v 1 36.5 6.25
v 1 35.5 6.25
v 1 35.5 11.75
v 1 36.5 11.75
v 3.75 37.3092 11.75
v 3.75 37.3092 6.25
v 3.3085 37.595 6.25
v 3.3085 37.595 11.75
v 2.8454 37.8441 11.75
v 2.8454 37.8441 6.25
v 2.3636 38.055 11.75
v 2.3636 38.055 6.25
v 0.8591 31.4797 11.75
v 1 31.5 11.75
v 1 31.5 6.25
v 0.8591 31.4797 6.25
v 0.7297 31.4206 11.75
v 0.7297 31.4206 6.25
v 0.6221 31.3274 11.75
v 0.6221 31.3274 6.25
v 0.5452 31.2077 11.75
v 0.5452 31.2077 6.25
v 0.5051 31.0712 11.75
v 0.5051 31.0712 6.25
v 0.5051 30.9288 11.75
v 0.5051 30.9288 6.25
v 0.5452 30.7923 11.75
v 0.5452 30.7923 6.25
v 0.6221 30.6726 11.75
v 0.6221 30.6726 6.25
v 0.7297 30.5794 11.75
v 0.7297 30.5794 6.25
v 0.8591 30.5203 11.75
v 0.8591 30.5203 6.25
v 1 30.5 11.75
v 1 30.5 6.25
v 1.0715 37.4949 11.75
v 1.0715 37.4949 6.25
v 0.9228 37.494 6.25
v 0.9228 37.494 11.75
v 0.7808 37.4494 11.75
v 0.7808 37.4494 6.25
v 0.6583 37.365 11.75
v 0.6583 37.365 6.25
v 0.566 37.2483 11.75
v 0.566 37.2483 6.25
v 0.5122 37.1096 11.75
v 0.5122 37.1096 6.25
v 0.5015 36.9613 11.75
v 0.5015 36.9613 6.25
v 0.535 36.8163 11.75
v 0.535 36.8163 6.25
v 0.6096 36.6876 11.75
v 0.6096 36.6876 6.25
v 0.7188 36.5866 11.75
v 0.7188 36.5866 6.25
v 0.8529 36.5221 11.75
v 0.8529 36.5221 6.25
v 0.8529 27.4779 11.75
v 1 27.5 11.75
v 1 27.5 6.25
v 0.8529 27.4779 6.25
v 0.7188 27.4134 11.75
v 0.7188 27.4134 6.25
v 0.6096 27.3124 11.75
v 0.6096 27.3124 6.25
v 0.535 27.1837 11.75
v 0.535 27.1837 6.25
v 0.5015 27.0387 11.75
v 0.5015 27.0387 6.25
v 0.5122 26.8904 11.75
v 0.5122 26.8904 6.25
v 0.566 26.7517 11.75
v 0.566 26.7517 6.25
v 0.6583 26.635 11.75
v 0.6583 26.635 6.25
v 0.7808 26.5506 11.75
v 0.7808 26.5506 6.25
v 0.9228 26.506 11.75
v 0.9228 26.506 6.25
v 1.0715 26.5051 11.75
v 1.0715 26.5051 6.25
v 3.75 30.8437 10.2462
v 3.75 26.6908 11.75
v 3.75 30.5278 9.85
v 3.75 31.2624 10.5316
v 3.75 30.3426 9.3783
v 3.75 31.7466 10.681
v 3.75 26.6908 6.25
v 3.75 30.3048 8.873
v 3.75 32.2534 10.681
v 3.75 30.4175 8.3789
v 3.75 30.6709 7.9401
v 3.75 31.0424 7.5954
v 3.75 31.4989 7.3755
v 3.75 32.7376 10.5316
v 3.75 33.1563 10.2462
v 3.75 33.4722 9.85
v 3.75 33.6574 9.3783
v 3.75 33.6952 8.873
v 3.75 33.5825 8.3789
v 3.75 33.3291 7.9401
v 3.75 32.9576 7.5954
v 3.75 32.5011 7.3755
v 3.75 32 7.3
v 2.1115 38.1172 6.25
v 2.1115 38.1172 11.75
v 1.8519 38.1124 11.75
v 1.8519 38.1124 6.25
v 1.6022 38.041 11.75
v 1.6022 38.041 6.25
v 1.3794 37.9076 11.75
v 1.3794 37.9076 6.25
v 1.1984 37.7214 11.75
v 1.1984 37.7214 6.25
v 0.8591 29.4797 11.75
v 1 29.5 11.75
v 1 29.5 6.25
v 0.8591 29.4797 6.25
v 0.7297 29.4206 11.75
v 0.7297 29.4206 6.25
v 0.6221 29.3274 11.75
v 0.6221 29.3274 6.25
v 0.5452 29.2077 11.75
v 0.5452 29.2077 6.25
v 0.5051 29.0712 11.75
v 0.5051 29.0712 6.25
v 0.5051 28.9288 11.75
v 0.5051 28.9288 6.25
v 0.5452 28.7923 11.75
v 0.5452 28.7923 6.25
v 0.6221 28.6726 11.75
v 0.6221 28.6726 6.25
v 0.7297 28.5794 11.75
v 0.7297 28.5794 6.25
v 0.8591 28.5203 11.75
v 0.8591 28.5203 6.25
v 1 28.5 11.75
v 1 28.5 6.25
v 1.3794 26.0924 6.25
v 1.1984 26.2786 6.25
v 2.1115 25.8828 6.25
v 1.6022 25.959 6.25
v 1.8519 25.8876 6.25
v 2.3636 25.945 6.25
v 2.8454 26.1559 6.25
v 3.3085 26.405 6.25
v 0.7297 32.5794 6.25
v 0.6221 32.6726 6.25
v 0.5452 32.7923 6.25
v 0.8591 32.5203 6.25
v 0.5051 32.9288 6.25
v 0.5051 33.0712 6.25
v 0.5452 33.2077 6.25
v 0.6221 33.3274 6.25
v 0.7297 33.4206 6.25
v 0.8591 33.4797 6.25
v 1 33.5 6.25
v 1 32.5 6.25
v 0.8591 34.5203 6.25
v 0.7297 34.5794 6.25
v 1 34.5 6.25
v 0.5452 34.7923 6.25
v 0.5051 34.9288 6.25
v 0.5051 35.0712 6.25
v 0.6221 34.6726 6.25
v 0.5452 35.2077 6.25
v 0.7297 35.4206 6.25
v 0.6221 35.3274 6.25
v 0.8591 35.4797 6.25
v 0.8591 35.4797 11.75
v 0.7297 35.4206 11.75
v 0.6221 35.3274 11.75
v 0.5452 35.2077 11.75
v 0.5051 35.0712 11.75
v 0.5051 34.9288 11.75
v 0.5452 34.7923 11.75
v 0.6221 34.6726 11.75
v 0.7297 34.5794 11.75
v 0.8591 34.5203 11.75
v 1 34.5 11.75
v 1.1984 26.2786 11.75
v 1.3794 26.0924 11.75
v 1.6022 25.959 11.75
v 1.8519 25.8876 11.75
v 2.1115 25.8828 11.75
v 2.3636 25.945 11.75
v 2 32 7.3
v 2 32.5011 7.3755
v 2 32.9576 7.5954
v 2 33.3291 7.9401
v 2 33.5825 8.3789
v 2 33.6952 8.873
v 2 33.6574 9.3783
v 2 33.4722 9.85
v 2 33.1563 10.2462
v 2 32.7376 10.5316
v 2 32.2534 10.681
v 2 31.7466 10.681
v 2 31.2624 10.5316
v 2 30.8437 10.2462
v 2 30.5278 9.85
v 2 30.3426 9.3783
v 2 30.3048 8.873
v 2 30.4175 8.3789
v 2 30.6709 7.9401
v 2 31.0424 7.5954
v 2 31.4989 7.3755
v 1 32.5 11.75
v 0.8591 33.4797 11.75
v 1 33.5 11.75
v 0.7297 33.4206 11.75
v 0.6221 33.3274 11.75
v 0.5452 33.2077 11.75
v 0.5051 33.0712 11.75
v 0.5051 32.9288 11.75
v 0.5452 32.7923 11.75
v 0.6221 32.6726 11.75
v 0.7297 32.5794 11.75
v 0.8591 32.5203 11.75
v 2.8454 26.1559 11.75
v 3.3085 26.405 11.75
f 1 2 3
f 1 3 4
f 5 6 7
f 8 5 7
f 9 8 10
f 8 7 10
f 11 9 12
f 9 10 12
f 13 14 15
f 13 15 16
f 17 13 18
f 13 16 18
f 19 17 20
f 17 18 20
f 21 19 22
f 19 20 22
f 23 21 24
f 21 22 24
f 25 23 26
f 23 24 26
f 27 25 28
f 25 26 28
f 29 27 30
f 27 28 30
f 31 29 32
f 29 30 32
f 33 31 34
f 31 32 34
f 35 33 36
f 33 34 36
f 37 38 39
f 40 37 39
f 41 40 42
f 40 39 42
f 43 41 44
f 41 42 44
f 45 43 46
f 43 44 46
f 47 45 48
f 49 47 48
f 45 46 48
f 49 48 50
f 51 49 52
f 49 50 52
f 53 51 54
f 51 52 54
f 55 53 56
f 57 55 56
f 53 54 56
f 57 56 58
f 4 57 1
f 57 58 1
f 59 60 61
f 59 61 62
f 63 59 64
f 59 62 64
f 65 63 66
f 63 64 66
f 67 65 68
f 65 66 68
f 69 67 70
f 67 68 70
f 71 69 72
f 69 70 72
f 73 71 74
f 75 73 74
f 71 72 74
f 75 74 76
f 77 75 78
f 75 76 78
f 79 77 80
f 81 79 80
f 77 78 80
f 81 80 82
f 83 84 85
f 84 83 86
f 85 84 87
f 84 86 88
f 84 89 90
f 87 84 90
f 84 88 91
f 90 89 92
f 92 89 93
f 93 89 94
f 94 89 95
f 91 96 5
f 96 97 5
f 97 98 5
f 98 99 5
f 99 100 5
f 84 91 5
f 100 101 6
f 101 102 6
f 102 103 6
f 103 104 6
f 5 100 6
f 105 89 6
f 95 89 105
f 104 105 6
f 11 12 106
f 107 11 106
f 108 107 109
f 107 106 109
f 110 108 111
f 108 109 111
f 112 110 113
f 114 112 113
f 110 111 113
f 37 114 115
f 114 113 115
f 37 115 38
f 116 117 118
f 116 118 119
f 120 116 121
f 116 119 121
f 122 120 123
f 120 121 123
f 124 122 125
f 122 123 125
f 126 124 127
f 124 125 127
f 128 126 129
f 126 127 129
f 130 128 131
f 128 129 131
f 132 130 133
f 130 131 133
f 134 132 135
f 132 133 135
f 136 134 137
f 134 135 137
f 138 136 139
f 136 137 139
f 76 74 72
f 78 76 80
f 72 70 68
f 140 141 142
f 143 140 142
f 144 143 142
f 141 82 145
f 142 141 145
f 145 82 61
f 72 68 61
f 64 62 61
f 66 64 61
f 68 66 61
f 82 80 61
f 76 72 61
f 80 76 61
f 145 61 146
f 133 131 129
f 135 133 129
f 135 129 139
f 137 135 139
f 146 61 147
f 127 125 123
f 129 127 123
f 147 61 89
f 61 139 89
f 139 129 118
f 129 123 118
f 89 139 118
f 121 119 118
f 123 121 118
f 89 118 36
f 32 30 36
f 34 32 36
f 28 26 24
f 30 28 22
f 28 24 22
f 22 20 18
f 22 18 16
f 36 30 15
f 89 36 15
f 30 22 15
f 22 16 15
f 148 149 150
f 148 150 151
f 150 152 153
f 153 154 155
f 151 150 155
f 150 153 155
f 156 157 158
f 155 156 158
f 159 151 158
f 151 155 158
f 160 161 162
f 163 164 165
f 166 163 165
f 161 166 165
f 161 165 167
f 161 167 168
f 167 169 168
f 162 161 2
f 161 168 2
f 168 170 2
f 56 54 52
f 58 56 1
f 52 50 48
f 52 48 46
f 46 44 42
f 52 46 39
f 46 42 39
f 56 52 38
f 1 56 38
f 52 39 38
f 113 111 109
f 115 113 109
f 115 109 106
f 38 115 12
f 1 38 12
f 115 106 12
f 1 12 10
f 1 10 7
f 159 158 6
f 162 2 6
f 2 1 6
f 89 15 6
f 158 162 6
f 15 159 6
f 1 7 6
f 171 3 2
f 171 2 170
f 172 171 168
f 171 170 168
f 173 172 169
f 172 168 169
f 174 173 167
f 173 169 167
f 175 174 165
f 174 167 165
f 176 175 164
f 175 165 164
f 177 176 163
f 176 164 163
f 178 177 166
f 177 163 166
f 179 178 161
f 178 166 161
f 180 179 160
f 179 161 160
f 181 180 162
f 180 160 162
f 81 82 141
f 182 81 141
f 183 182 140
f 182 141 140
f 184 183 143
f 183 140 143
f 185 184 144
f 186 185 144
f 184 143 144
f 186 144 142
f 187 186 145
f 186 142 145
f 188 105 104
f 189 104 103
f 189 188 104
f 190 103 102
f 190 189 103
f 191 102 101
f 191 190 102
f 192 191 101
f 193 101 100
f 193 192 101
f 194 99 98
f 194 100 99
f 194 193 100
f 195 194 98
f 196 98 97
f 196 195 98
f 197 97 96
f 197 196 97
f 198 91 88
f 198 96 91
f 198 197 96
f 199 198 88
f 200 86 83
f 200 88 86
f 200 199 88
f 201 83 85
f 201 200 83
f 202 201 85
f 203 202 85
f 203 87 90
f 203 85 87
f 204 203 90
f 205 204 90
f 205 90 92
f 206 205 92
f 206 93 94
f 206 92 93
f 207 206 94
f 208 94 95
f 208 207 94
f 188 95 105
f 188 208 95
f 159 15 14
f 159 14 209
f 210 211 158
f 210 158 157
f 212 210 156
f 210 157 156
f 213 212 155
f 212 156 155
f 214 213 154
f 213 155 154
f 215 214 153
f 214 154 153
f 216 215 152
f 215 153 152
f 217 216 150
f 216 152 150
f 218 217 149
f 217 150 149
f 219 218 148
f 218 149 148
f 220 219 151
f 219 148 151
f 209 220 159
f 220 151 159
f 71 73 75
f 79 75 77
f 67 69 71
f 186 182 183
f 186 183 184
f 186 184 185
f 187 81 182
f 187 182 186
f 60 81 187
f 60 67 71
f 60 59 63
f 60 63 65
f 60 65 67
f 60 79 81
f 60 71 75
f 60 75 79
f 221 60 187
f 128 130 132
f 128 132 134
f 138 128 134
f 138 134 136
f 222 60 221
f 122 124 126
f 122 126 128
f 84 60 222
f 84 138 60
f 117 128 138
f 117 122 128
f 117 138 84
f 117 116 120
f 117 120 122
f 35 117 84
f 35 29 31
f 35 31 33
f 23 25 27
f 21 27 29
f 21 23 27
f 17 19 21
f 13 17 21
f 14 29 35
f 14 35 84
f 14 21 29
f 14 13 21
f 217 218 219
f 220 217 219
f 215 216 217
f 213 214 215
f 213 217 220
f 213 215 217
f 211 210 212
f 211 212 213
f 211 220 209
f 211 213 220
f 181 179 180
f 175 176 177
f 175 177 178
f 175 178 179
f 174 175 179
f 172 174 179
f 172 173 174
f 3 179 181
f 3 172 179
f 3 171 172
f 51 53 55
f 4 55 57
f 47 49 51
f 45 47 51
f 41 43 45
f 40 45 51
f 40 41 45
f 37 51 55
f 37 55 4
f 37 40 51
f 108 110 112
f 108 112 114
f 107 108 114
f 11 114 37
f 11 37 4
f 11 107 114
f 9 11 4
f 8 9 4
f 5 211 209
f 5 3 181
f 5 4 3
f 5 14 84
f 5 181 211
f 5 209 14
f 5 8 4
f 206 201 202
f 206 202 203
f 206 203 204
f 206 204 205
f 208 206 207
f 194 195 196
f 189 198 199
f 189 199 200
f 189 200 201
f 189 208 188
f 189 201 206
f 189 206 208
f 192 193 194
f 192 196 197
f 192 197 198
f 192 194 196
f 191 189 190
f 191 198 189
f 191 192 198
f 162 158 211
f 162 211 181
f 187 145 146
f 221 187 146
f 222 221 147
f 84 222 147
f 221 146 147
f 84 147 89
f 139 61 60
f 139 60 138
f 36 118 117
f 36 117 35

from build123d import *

# Parameters (mm, degrees)
CYLINDER022_R     = 0.5
CYLINDER022_DEPTH = 5.5
CYLINDER020_R     = 0.5
CYLINDER020_DEPTH = 5.5
CYLINDER021_R     = 0.5
CYLINDER021_DEPTH = 5.5
CYLINDER023_R     = 0.5
CYLINDER023_DEPTH = 5.5
CYLINDER018_R     = 0.5
CYLINDER018_DEPTH = 5.5
CYLINDER017_R     = 1.7
CYLINDER017_DEPTH = 10
BOX012_W          = 10
BOX012_H          = 19
BOX012_DEPTH      = 10
BOX015_W          = 10
BOX015_H          = 19
BOX015_DEPTH      = 10
CYLINDER013_R     = 6.5
CYLINDER013_DEPTH = 5.5
FILLET003_R       = 1
CYLINDER024_R     = 0.5
CYLINDER024_DEPTH = 5.5


with BuildPart() as cylinder022:
    # Cylinder022 → Cylinder022 (new body)
    with BuildSketch(Plane(origin=(1, 31, 6.25), x_dir=(1, 0, 0), z_dir=(0, 0, 1))):
        Circle(CYLINDER022_R)
    extrude(amount=CYLINDER022_DEPTH)


with BuildPart() as cylinder020:
    # Cylinder020 → Cylinder020 (new body)
    with BuildSketch(Plane(origin=(1, 35, 6.25), x_dir=(1, 0, 0), z_dir=(0, 0, 1))):
        Circle(CYLINDER020_R)
    extrude(amount=CYLINDER020_DEPTH)


with BuildPart() as cylinder021:
    # Cylinder021 → Cylinder021 (new body)
    with BuildSketch(Plane(origin=(1, 37, 6.25), x_dir=(1, 0, 0), z_dir=(0, 0, 1))):
        Circle(CYLINDER021_R)
    extrude(amount=CYLINDER021_DEPTH)


with BuildPart() as cylinder023:
    # Cylinder023 → Cylinder023 (new body)
    with BuildSketch(Plane(origin=(1, 29, 6.25), x_dir=(1, 0, 0), z_dir=(0, 0, 1))):
        Circle(CYLINDER023_R)
    extrude(amount=CYLINDER023_DEPTH)


with BuildPart() as cylinder018:
    # Cylinder018 → Cylinder018 (new body)
    with BuildSketch(Plane(origin=(1, 27, 6.25), x_dir=(1, 0, 0), z_dir=(0, 0, 1))):
        Circle(CYLINDER018_R)
    extrude(amount=CYLINDER018_DEPTH)


with BuildPart() as cylinder017:
    # Cylinder017 → Cylinder017 (new body)
    with BuildSketch(Plane(origin=(2, 32, 9), x_dir=(0, 0, -1), z_dir=(1, 0, 0))):
        Circle(CYLINDER017_R)
    extrude(amount=CYLINDER017_DEPTH)


with BuildPart() as cube012:
    # Box012 → Box012 (new body)
    with BuildSketch(Plane(origin=(-9, 20.75, 2.25), x_dir=(1, 0, 0), z_dir=(0, 0, 1))):
        with Locations((5, 9.5)):
            Rectangle(BOX012_W, BOX012_H)
    extrude(amount=BOX012_DEPTH)


with BuildPart() as cube015:
    # Box015 → Box015 (new body)
    with BuildSketch(Plane(origin=(3.75, 20.75, 2.25), x_dir=(1, 0, 0), z_dir=(0, 0, 1))):
        with Locations((5, 9.5)):
            Rectangle(BOX015_W, BOX015_H)
    extrude(amount=BOX015_DEPTH)


with BuildPart() as cut002008023012009006003002006_body:
    # Cylinder013 → Cylinder013 (new body)
    with BuildSketch(Plane(origin=(0, 32, 6.25), x_dir=(1, 0, 0), z_dir=(0, 0, 1))):
        Circle(CYLINDER013_R)
    extrude(amount=CYLINDER013_DEPTH)

    # Cut002008023012009006003002006002006002004006: cut Cube015
    add(cube015.part, mode=Mode.SUBTRACT)

    # Cut002008023012009006003002006002006002004007: cut Cube012
    add(cube012.part, mode=Mode.SUBTRACT)

    # Fillet003
    fillet003_edges = [cut002008023012009006003002006_body.edges().sort_by_distance(p)[0] for p in [
        (1, 38.422616, 9),
        (1, 25.577384, 9),
    ]]
    fillet(fillet003_edges, radius=FILLET003_R)

    # Cut002008023012009006003002006002006002004008: cut Cylinder017
    add(cylinder017.part, mode=Mode.SUBTRACT)


with BuildPart() as wire_clamp:
    # Cylinder024 → Cylinder024 (new body)
    with BuildSketch(Plane(origin=(1, 33, 6.25), x_dir=(1, 0, 0), z_dir=(0, 0, 1))):
        Circle(CYLINDER024_R)
    extrude(amount=CYLINDER024_DEPTH)

    # Fusion001001001011002: union Cylinder022, Cylinder020, Cylinder021, Cylinder023, Cylinder018, Cut002008023012009006003002006 body
    add(cylinder022.part)
    add(cylinder020.part)
    add(cylinder021.part)
    add(cylinder023.part)
    add(cylinder018.part)
    add(cut002008023012009006003002006_body.part)


solid = wire_clamp.part
